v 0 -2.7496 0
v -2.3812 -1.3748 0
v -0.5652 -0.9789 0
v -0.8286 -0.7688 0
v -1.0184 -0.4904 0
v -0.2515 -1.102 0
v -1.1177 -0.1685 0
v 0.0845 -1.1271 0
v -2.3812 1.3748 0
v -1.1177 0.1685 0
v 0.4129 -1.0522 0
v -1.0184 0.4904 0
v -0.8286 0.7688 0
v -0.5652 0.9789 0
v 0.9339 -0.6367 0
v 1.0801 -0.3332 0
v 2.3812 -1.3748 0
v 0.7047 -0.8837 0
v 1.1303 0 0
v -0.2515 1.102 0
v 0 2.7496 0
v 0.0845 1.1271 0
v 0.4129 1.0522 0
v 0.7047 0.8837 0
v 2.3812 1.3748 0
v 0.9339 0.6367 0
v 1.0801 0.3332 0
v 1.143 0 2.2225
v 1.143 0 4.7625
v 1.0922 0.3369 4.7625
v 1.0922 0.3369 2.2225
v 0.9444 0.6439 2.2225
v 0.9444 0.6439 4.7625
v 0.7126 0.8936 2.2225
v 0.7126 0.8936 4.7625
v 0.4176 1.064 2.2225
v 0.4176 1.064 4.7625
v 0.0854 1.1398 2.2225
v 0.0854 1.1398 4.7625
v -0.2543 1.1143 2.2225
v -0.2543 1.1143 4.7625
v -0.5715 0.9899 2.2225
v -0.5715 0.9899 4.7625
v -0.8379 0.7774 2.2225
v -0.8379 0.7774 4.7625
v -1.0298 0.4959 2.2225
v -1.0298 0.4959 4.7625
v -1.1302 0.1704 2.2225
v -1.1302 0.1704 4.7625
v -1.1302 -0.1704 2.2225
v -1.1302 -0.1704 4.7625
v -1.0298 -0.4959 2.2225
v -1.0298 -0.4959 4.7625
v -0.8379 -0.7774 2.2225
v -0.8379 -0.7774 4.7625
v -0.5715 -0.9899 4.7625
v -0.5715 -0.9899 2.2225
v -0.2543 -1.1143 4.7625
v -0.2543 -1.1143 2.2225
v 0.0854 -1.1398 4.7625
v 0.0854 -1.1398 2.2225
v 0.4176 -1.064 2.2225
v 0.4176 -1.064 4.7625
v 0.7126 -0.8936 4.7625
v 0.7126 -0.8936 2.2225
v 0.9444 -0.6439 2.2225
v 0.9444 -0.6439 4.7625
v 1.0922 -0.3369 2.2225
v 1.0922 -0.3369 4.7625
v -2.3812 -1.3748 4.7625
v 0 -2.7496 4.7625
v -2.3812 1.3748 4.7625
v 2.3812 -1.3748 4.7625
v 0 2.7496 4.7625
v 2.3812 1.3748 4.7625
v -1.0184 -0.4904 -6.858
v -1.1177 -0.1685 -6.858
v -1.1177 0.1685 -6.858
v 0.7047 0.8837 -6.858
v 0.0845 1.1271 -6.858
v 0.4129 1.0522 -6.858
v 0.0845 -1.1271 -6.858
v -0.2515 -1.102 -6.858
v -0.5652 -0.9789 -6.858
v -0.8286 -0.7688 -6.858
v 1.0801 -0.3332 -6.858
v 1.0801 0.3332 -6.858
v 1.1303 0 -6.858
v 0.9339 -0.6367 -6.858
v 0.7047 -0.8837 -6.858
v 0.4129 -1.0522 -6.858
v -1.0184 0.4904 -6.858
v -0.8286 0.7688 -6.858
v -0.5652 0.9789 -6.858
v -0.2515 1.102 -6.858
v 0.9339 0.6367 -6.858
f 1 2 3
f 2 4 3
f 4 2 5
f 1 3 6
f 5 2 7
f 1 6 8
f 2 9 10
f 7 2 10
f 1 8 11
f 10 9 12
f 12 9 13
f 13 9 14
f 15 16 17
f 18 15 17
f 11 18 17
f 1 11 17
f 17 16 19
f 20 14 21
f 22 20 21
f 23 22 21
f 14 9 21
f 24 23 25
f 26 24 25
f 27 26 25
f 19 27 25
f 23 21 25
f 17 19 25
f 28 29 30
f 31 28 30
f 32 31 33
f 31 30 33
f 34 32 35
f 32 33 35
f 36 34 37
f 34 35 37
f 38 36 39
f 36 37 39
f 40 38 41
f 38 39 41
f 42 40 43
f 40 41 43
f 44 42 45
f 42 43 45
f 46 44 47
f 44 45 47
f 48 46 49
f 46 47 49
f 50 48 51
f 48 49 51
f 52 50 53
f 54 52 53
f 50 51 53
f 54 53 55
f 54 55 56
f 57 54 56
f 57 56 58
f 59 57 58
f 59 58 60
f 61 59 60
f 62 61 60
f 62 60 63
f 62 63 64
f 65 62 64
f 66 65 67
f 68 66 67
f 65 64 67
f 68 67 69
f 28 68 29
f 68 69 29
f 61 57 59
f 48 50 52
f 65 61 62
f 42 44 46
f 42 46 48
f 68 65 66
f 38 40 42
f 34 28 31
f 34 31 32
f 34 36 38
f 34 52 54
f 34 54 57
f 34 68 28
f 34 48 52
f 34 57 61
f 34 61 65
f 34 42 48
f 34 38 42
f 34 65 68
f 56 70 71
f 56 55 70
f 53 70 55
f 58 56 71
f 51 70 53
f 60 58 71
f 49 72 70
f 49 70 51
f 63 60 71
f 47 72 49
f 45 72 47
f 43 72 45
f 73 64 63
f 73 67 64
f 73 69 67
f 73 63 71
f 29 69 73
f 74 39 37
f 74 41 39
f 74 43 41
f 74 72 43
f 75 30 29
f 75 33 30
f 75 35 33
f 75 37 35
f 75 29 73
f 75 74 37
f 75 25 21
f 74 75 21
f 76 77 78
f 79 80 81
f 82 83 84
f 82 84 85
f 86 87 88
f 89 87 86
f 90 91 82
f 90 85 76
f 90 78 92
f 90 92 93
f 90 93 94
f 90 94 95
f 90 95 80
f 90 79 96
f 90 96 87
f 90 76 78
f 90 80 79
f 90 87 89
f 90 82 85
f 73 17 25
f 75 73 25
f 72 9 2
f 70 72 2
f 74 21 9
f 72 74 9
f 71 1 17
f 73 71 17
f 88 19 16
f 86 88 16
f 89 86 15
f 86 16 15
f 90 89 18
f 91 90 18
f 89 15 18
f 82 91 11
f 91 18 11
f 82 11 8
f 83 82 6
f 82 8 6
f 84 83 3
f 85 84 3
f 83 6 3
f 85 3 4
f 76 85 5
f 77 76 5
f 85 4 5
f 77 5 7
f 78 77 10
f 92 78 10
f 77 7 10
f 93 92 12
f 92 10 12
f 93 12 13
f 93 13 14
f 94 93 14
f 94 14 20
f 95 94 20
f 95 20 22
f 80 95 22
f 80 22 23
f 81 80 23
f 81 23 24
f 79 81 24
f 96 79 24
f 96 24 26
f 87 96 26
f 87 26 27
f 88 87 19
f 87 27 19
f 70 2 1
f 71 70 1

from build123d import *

# Parameters (mm, degrees)
BOSS_EXTRUDE1_DEPTH = 4.7625
SKETCH2_R           = 1.1303
BOSS_EXTRUDE2_DEPTH = 6.858
SKETCH3_R           = 1.143
CUT_EXTRUDE1_DEPTH  = 2.54


with BuildPart() as part:
    # Sketch1 → Boss-Extrude1 (new body)
    with BuildSketch(Plane.XY):
        Polygon((0, 2.749630657), (-2.38125, 1.374815329), (-2.38125, -1.374815329), (0, -2.749630657), (2.38125, -1.374815329), (2.38125, 1.374815329), align=None)
    extrude(amount=BOSS_EXTRUDE1_DEPTH)

    # Sketch2 → Boss-Extrude2 (add)
    with BuildSketch(Plane(origin=(0, 0, 0), x_dir=(-1, 0, 0), z_dir=(0, 0, -1))):
        with Locations(Location((0, 0, 0), (0, 0, 180))):
            Circle(SKETCH2_R)
    extrude(amount=BOSS_EXTRUDE2_DEPTH)

    # Sketch3 → Cut-Extrude1 (cut)
    with BuildSketch(Plane.XY.offset(4.7625)):
        Circle(SKETCH3_R)
    extrude(amount=-CUT_EXTRUDE1_DEPTH, mode=Mode.SUBTRACT)


solid = part.part
